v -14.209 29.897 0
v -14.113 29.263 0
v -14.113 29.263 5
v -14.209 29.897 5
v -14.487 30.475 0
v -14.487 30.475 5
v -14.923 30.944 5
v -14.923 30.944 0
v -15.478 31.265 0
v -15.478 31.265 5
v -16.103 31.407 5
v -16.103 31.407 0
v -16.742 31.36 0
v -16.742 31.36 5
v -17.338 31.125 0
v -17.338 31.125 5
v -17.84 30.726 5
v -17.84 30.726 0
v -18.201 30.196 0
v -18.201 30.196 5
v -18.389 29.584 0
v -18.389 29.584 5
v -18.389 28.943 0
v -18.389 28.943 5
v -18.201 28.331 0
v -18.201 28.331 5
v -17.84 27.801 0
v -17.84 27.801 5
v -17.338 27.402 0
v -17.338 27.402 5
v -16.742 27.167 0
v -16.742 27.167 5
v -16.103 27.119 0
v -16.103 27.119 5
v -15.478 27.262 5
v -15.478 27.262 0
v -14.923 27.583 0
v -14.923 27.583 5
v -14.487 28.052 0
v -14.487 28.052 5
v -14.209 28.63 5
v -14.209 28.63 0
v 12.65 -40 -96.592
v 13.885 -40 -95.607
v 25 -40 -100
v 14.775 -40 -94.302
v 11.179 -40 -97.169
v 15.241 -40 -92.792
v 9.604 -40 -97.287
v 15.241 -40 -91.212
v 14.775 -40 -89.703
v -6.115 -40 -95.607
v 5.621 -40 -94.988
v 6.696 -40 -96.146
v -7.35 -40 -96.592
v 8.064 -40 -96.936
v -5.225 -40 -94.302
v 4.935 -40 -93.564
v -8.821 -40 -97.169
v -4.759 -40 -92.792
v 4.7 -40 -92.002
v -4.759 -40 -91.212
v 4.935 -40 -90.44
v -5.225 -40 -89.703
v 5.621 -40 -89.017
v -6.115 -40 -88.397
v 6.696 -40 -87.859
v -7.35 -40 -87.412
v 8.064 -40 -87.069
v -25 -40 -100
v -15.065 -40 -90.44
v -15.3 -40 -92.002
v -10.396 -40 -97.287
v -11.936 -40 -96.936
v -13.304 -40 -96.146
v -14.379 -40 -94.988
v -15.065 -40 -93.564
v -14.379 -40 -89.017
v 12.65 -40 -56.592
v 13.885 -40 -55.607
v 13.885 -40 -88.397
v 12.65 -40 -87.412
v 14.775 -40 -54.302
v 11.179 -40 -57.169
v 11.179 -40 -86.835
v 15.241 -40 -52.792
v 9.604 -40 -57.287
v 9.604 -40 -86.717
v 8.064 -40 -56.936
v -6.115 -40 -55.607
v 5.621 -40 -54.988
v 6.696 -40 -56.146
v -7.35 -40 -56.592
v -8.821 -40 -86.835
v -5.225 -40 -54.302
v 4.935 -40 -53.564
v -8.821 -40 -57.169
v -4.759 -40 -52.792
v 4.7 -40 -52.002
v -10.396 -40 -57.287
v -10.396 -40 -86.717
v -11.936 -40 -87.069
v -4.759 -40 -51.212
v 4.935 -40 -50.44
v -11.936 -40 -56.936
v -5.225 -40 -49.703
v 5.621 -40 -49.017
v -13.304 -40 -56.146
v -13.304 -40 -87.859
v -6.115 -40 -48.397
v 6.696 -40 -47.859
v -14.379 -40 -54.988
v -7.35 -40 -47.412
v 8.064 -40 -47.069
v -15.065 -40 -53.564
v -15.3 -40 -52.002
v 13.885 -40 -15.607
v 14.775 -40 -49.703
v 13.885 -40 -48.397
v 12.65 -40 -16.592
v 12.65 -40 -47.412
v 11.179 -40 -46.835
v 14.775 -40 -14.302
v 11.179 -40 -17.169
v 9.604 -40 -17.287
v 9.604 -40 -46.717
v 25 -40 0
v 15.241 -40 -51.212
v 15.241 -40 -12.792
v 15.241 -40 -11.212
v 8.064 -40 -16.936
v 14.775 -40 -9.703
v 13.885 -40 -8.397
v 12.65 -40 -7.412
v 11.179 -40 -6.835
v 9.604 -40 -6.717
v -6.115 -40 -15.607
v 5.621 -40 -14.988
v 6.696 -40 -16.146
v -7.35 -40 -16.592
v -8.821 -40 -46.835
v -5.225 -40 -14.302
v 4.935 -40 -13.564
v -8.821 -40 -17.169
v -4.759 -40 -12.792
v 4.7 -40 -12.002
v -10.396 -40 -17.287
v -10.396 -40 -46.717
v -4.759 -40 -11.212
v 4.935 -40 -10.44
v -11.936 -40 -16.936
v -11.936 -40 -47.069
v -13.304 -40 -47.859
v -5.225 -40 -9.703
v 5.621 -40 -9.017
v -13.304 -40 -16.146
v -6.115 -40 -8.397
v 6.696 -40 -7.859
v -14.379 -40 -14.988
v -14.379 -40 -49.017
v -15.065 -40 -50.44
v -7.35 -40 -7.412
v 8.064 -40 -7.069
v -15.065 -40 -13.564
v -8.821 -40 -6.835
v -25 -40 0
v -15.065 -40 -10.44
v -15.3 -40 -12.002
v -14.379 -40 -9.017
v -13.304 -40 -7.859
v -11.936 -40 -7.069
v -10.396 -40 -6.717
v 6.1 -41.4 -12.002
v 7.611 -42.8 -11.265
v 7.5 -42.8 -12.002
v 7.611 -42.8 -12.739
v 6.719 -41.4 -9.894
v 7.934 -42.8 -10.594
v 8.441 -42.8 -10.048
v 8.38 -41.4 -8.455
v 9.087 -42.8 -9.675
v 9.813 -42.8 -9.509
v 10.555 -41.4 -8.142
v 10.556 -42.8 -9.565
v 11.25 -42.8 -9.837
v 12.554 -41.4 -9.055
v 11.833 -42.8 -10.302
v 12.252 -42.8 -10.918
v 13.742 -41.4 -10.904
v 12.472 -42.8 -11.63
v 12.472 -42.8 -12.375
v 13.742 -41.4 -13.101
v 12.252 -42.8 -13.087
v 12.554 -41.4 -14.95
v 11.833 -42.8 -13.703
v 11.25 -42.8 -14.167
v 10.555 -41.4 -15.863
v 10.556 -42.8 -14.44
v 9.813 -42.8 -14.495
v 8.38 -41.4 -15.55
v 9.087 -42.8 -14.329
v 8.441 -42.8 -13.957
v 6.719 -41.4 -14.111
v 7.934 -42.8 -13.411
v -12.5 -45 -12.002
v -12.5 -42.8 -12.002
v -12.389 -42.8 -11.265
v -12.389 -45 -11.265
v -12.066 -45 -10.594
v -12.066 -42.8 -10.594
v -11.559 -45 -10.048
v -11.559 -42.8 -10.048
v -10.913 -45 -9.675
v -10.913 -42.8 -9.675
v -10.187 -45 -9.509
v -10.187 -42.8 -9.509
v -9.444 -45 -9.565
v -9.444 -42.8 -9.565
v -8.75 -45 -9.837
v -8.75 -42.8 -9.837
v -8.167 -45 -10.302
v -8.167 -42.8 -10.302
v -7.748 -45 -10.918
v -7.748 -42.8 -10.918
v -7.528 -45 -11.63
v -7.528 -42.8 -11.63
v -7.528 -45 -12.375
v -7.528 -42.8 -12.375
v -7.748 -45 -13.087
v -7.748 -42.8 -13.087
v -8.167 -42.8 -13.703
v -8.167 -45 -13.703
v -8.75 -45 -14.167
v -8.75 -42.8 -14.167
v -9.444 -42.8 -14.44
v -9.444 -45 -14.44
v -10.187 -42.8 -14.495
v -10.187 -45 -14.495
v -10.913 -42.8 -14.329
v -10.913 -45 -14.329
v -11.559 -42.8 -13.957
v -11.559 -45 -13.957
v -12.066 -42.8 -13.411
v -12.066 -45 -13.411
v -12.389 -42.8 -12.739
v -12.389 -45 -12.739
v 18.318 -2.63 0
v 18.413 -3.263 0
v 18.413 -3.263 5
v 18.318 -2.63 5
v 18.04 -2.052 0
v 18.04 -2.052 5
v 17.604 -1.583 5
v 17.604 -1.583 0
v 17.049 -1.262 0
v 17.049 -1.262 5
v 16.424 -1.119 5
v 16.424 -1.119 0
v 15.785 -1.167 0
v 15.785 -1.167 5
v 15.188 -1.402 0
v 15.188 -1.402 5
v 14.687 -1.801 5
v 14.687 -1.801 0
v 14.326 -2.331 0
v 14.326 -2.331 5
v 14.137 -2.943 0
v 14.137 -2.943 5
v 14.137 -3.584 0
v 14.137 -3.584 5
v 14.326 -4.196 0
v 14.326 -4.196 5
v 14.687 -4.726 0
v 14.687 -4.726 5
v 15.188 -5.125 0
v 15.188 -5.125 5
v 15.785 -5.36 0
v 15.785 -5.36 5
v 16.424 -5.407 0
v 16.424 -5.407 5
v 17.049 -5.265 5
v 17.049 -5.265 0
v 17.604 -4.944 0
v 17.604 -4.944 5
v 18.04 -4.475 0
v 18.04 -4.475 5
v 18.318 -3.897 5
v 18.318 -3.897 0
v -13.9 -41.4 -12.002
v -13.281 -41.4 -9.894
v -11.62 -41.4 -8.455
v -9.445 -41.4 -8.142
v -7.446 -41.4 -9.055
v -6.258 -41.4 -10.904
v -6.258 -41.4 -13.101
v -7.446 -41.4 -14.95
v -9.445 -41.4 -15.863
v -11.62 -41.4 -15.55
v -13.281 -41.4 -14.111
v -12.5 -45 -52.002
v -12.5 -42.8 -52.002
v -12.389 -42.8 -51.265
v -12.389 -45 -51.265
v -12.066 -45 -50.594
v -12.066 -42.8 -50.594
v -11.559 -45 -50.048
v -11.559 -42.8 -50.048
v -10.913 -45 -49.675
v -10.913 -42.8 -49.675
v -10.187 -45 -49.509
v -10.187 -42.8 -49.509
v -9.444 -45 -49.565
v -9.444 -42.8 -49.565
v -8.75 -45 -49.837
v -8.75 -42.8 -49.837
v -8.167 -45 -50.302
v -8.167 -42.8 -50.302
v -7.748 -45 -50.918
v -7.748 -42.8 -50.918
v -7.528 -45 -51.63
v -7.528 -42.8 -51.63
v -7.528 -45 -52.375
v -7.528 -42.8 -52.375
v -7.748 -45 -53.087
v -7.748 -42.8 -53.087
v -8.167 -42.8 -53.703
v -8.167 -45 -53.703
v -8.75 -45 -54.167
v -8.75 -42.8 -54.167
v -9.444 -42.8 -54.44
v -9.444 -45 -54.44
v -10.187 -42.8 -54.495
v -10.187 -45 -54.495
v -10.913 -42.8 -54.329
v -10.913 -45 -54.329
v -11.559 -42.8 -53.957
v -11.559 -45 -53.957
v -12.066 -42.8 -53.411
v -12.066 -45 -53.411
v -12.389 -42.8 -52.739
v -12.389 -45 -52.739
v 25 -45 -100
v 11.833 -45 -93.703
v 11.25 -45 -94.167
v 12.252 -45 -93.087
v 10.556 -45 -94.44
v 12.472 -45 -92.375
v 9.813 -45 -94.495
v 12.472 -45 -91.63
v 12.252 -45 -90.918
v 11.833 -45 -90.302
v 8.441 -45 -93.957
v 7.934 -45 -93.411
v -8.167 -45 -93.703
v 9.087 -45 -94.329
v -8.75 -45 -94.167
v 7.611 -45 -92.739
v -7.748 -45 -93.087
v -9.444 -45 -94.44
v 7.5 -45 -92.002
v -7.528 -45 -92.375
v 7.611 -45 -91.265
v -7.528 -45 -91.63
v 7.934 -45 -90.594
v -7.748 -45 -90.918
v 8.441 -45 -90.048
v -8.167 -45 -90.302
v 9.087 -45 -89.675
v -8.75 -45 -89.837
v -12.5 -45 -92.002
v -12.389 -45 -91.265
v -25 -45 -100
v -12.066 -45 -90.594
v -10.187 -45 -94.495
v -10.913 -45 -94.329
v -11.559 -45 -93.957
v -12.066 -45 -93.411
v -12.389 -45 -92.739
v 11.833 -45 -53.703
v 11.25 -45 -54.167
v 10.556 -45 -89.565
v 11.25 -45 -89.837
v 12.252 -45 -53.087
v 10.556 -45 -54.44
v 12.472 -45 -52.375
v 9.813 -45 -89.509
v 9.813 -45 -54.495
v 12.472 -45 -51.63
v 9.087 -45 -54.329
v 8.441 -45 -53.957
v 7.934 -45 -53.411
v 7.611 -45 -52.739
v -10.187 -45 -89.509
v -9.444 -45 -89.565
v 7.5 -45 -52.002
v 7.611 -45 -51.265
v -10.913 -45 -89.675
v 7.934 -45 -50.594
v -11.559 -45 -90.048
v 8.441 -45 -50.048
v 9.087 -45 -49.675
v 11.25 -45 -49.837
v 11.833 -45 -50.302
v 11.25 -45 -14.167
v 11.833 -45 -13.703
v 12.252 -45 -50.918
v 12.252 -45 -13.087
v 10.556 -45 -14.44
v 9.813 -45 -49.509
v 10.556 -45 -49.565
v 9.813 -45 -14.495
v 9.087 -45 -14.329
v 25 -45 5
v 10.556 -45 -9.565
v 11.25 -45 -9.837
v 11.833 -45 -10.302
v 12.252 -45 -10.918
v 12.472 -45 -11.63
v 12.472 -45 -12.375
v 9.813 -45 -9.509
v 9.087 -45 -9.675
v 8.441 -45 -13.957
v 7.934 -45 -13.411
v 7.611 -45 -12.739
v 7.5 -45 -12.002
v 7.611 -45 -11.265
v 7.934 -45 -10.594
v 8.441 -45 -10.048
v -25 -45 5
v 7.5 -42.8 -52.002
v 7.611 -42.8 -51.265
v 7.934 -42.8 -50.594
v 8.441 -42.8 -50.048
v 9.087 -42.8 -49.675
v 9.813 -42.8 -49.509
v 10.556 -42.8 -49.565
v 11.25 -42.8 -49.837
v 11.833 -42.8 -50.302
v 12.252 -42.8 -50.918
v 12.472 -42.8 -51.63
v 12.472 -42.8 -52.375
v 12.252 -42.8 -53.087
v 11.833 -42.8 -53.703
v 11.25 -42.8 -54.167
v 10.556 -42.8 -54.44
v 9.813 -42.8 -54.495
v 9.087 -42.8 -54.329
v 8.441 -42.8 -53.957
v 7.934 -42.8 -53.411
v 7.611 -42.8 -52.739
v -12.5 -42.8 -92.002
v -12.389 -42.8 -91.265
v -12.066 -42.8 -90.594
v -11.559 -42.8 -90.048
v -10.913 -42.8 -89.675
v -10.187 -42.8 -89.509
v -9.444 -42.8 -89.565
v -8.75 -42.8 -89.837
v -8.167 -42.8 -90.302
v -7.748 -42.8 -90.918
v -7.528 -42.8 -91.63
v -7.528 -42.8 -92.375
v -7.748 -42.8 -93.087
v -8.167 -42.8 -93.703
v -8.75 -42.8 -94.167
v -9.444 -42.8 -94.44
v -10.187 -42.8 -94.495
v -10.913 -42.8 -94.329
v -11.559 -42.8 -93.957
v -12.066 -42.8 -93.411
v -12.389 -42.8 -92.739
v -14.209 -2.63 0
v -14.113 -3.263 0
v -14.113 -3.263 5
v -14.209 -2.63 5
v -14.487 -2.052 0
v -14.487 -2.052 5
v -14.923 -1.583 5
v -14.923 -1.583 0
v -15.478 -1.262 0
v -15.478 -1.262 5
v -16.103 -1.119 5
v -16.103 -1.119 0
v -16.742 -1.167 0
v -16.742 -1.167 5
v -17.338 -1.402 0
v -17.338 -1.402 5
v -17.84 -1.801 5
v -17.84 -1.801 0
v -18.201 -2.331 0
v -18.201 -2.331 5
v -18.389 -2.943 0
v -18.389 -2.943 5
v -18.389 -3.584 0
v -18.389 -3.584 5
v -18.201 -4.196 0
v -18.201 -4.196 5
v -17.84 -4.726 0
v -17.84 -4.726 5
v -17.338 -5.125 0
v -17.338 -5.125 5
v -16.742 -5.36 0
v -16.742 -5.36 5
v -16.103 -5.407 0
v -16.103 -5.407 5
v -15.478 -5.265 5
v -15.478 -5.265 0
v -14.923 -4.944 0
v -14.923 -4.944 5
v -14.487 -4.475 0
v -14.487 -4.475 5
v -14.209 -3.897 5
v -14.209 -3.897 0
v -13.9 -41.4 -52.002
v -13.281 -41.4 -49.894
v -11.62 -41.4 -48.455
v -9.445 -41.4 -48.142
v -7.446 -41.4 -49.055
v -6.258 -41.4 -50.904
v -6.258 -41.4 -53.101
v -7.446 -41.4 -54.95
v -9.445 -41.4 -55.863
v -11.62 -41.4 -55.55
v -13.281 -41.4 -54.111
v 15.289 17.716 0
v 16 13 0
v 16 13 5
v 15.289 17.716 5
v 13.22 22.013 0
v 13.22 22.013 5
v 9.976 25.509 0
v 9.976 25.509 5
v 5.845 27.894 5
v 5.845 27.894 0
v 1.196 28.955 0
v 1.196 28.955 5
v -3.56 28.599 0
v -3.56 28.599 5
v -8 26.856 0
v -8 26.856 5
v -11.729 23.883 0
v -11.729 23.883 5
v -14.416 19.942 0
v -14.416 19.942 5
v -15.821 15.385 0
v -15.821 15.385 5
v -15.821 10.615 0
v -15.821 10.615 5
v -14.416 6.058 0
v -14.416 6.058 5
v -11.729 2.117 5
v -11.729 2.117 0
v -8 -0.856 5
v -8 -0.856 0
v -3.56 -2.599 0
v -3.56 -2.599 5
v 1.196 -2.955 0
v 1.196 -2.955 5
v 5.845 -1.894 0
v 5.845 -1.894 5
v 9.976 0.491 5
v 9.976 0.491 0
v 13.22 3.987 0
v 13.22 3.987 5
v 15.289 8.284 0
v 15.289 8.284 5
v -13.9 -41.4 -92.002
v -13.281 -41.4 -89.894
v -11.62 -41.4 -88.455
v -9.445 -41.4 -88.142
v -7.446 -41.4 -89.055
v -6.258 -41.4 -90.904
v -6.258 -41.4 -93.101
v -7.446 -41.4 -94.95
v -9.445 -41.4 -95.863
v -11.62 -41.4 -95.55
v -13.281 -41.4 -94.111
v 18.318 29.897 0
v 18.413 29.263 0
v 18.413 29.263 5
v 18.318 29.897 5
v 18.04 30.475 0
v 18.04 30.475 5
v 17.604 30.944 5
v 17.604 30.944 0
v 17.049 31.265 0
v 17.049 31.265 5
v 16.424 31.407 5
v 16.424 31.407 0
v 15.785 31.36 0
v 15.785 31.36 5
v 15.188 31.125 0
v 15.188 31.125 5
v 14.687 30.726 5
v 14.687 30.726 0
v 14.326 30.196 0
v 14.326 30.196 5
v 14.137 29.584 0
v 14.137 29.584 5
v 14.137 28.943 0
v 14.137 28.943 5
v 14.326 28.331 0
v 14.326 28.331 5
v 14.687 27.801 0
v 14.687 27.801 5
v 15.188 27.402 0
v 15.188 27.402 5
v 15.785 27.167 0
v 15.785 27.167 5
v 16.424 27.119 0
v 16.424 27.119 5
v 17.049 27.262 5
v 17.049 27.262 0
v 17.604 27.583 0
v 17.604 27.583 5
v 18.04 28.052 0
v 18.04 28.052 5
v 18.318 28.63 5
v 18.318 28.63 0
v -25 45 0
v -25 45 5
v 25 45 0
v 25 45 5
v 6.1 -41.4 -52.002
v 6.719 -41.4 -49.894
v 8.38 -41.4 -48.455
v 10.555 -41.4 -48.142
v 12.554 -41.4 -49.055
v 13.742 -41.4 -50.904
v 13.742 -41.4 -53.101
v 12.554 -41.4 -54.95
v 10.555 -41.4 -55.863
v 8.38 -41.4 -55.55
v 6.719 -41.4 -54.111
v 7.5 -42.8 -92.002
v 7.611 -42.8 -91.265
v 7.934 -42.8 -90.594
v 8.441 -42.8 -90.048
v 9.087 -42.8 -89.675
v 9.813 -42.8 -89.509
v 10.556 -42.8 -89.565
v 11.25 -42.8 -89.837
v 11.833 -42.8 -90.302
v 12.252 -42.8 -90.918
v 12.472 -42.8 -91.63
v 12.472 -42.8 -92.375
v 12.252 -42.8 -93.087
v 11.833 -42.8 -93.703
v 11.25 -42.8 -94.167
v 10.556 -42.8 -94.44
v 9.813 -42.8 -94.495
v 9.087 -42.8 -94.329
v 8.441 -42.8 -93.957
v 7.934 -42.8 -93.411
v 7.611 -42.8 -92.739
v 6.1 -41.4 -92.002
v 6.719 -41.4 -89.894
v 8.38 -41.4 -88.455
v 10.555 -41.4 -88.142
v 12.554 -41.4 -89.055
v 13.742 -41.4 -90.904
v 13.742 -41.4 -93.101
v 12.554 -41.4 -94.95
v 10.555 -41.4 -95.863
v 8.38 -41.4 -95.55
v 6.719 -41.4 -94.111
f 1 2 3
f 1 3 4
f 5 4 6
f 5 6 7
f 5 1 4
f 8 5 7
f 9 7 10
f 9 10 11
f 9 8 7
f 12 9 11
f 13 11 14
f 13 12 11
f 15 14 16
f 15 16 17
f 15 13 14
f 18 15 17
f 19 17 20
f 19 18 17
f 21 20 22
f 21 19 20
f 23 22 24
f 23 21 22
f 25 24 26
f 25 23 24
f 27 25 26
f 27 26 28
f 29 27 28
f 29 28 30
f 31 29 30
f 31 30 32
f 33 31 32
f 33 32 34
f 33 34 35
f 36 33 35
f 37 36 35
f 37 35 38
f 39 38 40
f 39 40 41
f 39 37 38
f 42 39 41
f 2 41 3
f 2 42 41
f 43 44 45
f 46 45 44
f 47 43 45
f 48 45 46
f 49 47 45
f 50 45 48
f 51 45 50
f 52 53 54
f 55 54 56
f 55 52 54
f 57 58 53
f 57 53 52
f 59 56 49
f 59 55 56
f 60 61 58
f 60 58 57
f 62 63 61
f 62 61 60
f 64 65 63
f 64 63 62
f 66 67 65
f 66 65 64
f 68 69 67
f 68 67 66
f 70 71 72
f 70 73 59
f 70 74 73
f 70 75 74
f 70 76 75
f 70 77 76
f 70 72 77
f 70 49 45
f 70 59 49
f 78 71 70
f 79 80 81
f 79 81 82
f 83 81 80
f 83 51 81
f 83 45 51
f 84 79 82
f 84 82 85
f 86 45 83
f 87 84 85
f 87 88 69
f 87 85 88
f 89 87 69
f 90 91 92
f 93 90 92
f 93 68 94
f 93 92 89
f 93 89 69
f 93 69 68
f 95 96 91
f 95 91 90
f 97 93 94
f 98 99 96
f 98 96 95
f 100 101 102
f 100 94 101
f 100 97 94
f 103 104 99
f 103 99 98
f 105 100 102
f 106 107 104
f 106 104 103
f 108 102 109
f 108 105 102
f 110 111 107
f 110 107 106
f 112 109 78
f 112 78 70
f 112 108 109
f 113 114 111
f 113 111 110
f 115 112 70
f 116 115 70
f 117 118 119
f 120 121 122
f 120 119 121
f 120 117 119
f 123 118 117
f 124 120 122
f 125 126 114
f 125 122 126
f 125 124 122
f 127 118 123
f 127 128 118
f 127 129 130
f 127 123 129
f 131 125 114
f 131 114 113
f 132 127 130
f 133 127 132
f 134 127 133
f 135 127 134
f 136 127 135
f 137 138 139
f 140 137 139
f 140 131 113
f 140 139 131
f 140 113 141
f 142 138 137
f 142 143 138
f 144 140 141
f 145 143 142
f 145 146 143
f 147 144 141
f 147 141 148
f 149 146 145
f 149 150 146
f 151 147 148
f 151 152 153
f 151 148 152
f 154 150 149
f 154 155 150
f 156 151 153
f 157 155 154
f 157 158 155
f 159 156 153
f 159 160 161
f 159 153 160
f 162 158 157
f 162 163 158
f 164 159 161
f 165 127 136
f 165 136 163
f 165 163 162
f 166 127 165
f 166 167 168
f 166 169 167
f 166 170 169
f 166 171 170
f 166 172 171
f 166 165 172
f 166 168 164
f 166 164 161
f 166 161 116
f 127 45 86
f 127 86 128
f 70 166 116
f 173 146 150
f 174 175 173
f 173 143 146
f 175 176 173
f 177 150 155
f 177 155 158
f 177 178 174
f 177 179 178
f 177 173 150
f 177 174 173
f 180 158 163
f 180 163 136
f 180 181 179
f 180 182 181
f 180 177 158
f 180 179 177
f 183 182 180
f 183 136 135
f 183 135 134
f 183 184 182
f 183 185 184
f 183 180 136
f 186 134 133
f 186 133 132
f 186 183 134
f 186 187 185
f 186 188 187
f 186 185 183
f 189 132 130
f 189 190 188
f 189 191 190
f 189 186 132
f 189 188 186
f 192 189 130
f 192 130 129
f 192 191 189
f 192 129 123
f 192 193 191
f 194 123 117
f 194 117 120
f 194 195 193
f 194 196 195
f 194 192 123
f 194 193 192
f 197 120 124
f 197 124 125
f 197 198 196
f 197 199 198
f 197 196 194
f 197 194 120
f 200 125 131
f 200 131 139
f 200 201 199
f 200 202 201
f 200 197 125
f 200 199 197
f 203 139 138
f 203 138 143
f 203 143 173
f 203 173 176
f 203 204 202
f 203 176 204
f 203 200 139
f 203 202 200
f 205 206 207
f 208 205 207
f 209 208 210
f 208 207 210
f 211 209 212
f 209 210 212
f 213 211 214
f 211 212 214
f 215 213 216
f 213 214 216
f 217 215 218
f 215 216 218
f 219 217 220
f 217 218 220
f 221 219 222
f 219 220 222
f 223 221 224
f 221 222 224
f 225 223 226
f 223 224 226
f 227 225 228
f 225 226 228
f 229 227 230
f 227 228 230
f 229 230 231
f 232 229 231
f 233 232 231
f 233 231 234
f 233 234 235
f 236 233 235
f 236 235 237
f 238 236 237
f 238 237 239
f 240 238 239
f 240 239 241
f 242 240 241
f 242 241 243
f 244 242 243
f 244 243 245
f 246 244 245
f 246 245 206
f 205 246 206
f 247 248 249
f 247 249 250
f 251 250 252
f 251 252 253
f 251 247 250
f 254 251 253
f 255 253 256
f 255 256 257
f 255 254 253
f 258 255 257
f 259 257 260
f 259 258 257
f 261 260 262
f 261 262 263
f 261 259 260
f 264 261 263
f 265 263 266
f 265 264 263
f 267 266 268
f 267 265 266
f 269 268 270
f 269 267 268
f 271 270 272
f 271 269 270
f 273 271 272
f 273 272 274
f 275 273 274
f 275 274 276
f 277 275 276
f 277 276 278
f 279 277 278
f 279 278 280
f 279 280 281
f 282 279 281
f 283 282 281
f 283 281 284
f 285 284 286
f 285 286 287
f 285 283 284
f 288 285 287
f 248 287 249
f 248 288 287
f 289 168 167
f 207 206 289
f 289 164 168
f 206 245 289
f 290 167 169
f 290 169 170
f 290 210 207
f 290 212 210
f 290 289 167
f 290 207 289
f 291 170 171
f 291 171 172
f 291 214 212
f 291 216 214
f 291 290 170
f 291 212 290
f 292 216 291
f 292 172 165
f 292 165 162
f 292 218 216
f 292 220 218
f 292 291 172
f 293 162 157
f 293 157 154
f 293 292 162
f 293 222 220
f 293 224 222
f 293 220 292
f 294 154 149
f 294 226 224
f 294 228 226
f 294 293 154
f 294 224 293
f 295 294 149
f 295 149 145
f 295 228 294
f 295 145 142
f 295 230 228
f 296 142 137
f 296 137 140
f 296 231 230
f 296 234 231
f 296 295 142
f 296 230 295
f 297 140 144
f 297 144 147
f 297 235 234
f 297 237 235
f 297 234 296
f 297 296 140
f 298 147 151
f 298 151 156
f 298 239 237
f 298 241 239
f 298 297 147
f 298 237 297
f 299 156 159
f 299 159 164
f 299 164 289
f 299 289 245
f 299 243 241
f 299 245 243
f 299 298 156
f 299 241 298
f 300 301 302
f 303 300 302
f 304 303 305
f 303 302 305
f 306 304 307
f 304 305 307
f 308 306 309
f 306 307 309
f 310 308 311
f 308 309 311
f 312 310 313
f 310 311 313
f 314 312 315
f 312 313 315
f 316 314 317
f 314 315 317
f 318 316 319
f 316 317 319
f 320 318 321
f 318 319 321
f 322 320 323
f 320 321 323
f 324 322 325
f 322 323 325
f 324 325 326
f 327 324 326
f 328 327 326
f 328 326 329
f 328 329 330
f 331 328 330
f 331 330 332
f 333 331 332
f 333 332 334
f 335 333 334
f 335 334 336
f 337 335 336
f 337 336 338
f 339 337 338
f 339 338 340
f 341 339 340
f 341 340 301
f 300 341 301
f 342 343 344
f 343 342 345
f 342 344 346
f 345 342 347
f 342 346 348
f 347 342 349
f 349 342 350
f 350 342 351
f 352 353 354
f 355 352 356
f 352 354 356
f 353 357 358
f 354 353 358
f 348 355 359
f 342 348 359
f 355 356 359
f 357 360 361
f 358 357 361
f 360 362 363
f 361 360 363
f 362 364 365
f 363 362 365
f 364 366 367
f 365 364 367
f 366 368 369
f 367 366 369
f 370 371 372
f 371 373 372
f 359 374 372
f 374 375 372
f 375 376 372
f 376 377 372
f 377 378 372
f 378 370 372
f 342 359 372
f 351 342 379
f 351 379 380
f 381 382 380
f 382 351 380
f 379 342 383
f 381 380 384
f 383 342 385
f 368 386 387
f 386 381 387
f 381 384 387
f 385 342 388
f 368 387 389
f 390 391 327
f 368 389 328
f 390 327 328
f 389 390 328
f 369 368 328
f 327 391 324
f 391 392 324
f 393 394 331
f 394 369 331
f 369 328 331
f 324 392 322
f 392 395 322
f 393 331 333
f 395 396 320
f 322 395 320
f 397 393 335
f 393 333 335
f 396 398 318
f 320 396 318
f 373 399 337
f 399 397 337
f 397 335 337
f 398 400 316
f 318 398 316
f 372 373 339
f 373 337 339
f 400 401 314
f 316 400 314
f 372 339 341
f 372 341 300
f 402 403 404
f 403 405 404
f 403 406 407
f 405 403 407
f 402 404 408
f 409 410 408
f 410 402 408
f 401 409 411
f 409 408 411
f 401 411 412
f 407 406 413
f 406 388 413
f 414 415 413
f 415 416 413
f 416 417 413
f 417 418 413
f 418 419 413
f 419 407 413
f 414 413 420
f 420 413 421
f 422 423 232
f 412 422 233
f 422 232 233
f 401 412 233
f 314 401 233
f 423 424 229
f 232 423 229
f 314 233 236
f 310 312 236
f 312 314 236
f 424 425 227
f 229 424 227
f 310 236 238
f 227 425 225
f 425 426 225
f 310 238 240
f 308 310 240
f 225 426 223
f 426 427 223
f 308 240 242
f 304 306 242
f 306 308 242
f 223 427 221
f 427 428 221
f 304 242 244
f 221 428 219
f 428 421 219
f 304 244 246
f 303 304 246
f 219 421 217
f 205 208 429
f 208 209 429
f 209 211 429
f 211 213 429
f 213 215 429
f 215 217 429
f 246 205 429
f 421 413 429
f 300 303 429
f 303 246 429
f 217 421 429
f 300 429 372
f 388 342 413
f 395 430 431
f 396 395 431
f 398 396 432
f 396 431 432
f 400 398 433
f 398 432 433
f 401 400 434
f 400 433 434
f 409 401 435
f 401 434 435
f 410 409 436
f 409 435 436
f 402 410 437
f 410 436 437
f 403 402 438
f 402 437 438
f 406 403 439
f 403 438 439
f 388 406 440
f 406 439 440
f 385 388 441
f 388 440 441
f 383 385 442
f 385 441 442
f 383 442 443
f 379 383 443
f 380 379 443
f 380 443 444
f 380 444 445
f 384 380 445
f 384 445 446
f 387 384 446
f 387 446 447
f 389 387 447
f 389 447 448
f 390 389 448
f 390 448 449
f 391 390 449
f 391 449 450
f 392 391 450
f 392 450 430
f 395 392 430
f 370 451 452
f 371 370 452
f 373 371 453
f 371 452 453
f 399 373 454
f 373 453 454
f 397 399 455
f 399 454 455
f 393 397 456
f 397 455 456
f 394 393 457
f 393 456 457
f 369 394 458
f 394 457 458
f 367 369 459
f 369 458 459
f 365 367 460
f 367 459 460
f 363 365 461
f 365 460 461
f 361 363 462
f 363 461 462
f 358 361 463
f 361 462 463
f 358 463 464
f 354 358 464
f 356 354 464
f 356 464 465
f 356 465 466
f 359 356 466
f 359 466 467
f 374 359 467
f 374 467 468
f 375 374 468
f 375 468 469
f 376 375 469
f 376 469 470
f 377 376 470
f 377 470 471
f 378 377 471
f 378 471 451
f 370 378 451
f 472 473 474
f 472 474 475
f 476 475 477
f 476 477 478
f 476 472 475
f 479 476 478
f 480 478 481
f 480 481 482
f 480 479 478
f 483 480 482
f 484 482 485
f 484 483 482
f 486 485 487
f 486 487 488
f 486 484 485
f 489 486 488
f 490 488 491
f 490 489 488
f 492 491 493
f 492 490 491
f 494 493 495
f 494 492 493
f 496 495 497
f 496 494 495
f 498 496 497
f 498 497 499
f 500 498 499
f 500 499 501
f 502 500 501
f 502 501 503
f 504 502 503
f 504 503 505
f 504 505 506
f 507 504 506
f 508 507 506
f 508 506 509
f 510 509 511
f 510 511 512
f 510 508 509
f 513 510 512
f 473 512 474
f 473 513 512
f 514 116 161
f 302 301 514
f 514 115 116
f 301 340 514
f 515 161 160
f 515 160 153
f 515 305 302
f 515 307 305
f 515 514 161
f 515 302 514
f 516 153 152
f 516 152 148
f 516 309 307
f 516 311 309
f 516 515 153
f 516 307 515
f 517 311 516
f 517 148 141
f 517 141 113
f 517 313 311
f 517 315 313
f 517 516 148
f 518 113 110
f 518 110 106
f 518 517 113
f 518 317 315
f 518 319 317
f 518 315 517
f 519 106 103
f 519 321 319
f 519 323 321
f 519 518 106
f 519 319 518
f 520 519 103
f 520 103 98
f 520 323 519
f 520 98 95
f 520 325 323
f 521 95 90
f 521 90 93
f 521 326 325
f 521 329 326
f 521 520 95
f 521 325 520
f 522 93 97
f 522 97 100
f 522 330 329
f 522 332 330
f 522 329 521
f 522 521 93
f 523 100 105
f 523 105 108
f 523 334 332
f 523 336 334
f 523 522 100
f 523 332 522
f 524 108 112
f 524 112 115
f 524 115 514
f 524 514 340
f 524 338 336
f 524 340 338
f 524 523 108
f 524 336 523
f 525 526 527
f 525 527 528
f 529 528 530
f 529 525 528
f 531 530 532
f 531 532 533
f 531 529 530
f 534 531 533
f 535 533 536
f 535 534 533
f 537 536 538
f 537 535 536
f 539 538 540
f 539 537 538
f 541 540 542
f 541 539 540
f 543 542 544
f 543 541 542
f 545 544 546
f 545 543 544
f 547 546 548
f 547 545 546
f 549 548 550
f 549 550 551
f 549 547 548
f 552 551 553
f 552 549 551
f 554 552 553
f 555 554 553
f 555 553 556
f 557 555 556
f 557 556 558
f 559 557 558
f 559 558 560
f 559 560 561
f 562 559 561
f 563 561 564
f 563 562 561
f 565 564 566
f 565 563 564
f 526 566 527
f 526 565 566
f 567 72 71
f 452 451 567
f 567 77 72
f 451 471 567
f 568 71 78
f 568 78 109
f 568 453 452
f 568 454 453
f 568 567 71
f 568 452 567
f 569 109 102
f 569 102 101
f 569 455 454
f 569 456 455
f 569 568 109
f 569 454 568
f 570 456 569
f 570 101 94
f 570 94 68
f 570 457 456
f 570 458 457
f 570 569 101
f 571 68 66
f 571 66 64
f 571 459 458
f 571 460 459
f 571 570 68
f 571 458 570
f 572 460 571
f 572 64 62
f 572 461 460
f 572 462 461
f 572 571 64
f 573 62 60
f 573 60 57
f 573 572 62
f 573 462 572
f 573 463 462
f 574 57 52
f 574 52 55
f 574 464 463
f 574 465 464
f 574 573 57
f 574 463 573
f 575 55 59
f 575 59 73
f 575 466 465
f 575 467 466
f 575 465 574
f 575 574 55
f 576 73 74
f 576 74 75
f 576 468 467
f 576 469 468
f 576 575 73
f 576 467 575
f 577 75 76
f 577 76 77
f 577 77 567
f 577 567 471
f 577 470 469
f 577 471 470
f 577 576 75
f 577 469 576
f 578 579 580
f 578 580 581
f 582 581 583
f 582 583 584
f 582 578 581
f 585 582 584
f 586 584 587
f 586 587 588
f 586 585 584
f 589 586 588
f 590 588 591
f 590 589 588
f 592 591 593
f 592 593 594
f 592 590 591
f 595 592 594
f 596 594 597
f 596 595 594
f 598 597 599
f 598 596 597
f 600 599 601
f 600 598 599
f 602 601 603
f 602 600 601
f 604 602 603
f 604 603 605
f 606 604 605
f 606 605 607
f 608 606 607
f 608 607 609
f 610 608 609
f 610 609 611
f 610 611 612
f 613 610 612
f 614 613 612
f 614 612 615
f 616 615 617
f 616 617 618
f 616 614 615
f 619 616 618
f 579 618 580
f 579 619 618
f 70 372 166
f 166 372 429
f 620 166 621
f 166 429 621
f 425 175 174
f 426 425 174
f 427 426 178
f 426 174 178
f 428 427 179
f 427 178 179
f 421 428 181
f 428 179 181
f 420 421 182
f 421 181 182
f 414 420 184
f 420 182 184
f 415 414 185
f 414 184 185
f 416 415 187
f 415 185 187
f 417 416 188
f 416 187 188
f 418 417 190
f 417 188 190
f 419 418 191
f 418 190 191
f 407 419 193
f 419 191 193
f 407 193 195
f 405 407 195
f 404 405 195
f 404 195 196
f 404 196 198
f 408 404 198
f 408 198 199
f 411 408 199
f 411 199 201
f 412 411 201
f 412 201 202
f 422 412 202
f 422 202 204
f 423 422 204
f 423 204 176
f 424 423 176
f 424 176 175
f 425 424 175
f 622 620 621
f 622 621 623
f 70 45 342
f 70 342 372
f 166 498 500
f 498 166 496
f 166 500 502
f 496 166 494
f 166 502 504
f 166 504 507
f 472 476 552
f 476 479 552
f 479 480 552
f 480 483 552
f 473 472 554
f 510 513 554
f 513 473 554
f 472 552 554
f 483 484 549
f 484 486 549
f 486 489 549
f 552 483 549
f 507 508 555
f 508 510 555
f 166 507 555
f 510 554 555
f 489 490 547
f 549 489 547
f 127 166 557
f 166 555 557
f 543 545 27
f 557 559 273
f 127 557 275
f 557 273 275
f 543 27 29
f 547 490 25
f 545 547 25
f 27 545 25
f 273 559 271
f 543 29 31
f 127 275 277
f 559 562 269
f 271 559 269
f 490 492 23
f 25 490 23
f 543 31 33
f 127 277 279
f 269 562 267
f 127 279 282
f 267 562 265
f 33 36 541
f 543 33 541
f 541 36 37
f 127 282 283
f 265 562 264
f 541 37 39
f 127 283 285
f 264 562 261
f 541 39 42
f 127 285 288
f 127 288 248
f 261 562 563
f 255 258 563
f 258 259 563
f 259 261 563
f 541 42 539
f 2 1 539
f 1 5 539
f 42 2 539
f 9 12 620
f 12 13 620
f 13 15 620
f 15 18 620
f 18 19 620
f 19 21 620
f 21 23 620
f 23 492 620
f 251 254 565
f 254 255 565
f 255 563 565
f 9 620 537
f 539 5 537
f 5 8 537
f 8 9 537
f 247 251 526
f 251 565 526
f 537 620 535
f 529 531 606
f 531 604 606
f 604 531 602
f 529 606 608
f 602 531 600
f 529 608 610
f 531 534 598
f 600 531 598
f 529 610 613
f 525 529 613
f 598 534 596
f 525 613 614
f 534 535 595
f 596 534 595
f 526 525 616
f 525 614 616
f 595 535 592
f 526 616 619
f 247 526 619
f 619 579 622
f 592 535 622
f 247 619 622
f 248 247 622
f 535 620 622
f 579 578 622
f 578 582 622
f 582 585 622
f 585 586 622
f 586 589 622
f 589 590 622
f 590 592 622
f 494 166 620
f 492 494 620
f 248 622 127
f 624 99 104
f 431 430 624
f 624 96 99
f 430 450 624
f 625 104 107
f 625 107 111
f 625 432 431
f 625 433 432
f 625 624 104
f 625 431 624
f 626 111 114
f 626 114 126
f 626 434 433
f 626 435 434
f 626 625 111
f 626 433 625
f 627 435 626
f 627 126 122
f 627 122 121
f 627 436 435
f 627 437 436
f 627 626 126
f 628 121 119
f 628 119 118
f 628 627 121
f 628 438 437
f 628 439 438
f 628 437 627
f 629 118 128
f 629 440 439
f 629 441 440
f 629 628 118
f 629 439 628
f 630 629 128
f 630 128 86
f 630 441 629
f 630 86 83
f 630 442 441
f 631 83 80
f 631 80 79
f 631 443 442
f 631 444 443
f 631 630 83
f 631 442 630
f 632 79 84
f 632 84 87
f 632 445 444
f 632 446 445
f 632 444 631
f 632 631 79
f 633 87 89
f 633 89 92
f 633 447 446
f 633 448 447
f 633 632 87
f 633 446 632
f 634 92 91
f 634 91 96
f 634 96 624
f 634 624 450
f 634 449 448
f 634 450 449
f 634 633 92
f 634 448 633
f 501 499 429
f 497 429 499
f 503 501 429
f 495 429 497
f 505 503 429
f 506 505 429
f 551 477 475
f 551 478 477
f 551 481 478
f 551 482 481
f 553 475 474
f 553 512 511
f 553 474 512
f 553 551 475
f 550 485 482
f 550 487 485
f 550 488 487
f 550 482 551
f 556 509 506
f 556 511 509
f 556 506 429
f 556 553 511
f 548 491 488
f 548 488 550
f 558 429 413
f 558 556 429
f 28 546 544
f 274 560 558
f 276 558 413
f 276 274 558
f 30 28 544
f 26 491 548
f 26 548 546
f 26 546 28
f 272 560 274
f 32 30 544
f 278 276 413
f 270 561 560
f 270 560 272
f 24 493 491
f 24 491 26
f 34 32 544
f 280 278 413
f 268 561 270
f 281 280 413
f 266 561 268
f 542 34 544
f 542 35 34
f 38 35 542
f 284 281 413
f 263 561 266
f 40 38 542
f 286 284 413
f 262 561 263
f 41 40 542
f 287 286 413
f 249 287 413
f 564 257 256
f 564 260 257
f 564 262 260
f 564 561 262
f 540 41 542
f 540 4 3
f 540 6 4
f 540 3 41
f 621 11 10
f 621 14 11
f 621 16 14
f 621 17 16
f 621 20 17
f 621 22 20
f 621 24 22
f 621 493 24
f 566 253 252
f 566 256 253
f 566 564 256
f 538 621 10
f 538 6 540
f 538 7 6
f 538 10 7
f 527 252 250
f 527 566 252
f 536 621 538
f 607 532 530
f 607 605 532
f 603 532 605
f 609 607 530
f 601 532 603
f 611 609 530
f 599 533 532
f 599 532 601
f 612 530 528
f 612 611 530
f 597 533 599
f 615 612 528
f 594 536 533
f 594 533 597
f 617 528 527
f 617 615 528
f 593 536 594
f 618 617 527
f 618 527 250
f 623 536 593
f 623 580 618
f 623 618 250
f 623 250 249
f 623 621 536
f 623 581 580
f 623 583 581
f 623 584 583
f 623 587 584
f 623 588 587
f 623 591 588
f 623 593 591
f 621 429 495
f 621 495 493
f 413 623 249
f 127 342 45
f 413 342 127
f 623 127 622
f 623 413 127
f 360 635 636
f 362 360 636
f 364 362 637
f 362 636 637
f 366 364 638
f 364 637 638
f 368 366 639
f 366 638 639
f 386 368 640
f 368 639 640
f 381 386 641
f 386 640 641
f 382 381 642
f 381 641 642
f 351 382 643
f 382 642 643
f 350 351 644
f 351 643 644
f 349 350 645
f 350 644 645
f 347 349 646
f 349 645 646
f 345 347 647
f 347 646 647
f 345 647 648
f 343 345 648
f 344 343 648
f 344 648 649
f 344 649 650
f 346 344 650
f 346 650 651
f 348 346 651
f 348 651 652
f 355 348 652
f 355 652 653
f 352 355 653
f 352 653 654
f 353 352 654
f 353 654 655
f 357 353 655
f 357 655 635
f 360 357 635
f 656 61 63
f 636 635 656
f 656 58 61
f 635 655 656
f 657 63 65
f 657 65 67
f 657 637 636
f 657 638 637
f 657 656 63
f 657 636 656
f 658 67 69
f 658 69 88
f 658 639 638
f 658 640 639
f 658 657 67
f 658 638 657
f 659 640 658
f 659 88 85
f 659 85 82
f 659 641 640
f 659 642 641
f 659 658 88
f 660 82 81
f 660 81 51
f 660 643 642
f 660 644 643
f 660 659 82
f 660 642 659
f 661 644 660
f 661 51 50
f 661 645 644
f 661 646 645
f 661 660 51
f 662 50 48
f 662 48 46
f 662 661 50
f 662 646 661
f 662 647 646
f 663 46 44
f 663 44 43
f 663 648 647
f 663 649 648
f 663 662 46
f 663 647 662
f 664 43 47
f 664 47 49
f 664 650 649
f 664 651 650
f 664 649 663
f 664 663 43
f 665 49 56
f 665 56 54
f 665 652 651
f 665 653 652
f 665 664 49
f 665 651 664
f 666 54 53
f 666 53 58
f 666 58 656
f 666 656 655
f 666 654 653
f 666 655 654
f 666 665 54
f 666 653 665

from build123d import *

# Parameters (mm, degrees)
SKETCH2_W           = 50
SKETCH2_H           = 90
SKETCH2_R           = 16
SKETCH2_R_2         = 2.15
BOSS_EXTRUDE1_DEPTH = 5
SKETCH3_W           = 50
SKETCH3_H           = 5
BOSS_EXTRUDE2_DEPTH = 100
SKETCH4_R           = 2.5
CUT_EXTRUDE1_DEPTH  = 134.603892159
CHAMFER1_SIZE       = 2.8


with BuildPart() as part:
    # Sketch2 → Boss-Extrude1 (new body)
    with BuildSketch(Plane.XY):
        Rectangle(SKETCH2_W, SKETCH2_H)
        with Locations((0, 13)):
            Circle(SKETCH2_R, mode=Mode.SUBTRACT)
        with Locations((-16.263455967, 29.263455967)):
            Circle(SKETCH2_R_2, mode=Mode.SUBTRACT)
        with Locations((16.263455967, 29.263455967)):
            Circle(SKETCH2_R_2, mode=Mode.SUBTRACT)
        with Locations((16.263455967, -3.263455967)):
            Circle(SKETCH2_R_2, mode=Mode.SUBTRACT)
        with Locations((-16.263455967, -3.263455967)):
            Circle(SKETCH2_R_2, mode=Mode.SUBTRACT)
    extrude(amount=BOSS_EXTRUDE1_DEPTH)

    # Sketch3 → Boss-Extrude2 (add)
    with BuildSketch(Plane(origin=(0, 0, 0), x_dir=(-1, 0, 0), z_dir=(0, 0, -1))):
        with Locations((0, -42.5)):
            Rectangle(SKETCH3_W, SKETCH3_H)
    extrude(amount=BOSS_EXTRUDE2_DEPTH)

    # Sketch4 → Cut-Extrude1 (cut, through all)
    with BuildSketch(Plane(origin=(0, -40, 0), x_dir=(1, 0, 0), z_dir=(0, 1, 0))):
        with Locations(Location((-10, 92.002293004, 0), (0, 0, 180))):
            Circle(SKETCH4_R)
        with Locations(Location((10, 92.002293004, 0), (0, 0, 180))):
            Circle(SKETCH4_R)
        with Locations(Location((-10, 12.002293004, 0), (0, 0, 180))):
            Circle(SKETCH4_R)
        with Locations(Location((10, 12.002293004, 0), (0, 0, 180))):
            Circle(SKETCH4_R)
        with Locations(Location((-10, 52.002293004, 0), (0, 0, 180))):
            Circle(SKETCH4_R)
        with Locations(Location((10, 52.002293004, 0), (0, 0, 180))):
            Circle(SKETCH4_R)
    extrude(amount=-CUT_EXTRUDE1_DEPTH, mode=Mode.SUBTRACT)

    # Chamfer1
    chamfer1_edges = [part.edges().sort_by_distance(p)[0] for p in [
        (-7.5, -40, -92.002293004),
        (12.5, -40, -92.002293004),
        (-7.5, -40, -12.002293004),
        (12.5, -40, -12.002293004),
        (-7.5, -40, -52.002293004),
        (12.5, -40, -52.002293004),
    ]]
    chamfer(chamfer1_edges, length=CHAMFER1_SIZE)


solid = part.part
